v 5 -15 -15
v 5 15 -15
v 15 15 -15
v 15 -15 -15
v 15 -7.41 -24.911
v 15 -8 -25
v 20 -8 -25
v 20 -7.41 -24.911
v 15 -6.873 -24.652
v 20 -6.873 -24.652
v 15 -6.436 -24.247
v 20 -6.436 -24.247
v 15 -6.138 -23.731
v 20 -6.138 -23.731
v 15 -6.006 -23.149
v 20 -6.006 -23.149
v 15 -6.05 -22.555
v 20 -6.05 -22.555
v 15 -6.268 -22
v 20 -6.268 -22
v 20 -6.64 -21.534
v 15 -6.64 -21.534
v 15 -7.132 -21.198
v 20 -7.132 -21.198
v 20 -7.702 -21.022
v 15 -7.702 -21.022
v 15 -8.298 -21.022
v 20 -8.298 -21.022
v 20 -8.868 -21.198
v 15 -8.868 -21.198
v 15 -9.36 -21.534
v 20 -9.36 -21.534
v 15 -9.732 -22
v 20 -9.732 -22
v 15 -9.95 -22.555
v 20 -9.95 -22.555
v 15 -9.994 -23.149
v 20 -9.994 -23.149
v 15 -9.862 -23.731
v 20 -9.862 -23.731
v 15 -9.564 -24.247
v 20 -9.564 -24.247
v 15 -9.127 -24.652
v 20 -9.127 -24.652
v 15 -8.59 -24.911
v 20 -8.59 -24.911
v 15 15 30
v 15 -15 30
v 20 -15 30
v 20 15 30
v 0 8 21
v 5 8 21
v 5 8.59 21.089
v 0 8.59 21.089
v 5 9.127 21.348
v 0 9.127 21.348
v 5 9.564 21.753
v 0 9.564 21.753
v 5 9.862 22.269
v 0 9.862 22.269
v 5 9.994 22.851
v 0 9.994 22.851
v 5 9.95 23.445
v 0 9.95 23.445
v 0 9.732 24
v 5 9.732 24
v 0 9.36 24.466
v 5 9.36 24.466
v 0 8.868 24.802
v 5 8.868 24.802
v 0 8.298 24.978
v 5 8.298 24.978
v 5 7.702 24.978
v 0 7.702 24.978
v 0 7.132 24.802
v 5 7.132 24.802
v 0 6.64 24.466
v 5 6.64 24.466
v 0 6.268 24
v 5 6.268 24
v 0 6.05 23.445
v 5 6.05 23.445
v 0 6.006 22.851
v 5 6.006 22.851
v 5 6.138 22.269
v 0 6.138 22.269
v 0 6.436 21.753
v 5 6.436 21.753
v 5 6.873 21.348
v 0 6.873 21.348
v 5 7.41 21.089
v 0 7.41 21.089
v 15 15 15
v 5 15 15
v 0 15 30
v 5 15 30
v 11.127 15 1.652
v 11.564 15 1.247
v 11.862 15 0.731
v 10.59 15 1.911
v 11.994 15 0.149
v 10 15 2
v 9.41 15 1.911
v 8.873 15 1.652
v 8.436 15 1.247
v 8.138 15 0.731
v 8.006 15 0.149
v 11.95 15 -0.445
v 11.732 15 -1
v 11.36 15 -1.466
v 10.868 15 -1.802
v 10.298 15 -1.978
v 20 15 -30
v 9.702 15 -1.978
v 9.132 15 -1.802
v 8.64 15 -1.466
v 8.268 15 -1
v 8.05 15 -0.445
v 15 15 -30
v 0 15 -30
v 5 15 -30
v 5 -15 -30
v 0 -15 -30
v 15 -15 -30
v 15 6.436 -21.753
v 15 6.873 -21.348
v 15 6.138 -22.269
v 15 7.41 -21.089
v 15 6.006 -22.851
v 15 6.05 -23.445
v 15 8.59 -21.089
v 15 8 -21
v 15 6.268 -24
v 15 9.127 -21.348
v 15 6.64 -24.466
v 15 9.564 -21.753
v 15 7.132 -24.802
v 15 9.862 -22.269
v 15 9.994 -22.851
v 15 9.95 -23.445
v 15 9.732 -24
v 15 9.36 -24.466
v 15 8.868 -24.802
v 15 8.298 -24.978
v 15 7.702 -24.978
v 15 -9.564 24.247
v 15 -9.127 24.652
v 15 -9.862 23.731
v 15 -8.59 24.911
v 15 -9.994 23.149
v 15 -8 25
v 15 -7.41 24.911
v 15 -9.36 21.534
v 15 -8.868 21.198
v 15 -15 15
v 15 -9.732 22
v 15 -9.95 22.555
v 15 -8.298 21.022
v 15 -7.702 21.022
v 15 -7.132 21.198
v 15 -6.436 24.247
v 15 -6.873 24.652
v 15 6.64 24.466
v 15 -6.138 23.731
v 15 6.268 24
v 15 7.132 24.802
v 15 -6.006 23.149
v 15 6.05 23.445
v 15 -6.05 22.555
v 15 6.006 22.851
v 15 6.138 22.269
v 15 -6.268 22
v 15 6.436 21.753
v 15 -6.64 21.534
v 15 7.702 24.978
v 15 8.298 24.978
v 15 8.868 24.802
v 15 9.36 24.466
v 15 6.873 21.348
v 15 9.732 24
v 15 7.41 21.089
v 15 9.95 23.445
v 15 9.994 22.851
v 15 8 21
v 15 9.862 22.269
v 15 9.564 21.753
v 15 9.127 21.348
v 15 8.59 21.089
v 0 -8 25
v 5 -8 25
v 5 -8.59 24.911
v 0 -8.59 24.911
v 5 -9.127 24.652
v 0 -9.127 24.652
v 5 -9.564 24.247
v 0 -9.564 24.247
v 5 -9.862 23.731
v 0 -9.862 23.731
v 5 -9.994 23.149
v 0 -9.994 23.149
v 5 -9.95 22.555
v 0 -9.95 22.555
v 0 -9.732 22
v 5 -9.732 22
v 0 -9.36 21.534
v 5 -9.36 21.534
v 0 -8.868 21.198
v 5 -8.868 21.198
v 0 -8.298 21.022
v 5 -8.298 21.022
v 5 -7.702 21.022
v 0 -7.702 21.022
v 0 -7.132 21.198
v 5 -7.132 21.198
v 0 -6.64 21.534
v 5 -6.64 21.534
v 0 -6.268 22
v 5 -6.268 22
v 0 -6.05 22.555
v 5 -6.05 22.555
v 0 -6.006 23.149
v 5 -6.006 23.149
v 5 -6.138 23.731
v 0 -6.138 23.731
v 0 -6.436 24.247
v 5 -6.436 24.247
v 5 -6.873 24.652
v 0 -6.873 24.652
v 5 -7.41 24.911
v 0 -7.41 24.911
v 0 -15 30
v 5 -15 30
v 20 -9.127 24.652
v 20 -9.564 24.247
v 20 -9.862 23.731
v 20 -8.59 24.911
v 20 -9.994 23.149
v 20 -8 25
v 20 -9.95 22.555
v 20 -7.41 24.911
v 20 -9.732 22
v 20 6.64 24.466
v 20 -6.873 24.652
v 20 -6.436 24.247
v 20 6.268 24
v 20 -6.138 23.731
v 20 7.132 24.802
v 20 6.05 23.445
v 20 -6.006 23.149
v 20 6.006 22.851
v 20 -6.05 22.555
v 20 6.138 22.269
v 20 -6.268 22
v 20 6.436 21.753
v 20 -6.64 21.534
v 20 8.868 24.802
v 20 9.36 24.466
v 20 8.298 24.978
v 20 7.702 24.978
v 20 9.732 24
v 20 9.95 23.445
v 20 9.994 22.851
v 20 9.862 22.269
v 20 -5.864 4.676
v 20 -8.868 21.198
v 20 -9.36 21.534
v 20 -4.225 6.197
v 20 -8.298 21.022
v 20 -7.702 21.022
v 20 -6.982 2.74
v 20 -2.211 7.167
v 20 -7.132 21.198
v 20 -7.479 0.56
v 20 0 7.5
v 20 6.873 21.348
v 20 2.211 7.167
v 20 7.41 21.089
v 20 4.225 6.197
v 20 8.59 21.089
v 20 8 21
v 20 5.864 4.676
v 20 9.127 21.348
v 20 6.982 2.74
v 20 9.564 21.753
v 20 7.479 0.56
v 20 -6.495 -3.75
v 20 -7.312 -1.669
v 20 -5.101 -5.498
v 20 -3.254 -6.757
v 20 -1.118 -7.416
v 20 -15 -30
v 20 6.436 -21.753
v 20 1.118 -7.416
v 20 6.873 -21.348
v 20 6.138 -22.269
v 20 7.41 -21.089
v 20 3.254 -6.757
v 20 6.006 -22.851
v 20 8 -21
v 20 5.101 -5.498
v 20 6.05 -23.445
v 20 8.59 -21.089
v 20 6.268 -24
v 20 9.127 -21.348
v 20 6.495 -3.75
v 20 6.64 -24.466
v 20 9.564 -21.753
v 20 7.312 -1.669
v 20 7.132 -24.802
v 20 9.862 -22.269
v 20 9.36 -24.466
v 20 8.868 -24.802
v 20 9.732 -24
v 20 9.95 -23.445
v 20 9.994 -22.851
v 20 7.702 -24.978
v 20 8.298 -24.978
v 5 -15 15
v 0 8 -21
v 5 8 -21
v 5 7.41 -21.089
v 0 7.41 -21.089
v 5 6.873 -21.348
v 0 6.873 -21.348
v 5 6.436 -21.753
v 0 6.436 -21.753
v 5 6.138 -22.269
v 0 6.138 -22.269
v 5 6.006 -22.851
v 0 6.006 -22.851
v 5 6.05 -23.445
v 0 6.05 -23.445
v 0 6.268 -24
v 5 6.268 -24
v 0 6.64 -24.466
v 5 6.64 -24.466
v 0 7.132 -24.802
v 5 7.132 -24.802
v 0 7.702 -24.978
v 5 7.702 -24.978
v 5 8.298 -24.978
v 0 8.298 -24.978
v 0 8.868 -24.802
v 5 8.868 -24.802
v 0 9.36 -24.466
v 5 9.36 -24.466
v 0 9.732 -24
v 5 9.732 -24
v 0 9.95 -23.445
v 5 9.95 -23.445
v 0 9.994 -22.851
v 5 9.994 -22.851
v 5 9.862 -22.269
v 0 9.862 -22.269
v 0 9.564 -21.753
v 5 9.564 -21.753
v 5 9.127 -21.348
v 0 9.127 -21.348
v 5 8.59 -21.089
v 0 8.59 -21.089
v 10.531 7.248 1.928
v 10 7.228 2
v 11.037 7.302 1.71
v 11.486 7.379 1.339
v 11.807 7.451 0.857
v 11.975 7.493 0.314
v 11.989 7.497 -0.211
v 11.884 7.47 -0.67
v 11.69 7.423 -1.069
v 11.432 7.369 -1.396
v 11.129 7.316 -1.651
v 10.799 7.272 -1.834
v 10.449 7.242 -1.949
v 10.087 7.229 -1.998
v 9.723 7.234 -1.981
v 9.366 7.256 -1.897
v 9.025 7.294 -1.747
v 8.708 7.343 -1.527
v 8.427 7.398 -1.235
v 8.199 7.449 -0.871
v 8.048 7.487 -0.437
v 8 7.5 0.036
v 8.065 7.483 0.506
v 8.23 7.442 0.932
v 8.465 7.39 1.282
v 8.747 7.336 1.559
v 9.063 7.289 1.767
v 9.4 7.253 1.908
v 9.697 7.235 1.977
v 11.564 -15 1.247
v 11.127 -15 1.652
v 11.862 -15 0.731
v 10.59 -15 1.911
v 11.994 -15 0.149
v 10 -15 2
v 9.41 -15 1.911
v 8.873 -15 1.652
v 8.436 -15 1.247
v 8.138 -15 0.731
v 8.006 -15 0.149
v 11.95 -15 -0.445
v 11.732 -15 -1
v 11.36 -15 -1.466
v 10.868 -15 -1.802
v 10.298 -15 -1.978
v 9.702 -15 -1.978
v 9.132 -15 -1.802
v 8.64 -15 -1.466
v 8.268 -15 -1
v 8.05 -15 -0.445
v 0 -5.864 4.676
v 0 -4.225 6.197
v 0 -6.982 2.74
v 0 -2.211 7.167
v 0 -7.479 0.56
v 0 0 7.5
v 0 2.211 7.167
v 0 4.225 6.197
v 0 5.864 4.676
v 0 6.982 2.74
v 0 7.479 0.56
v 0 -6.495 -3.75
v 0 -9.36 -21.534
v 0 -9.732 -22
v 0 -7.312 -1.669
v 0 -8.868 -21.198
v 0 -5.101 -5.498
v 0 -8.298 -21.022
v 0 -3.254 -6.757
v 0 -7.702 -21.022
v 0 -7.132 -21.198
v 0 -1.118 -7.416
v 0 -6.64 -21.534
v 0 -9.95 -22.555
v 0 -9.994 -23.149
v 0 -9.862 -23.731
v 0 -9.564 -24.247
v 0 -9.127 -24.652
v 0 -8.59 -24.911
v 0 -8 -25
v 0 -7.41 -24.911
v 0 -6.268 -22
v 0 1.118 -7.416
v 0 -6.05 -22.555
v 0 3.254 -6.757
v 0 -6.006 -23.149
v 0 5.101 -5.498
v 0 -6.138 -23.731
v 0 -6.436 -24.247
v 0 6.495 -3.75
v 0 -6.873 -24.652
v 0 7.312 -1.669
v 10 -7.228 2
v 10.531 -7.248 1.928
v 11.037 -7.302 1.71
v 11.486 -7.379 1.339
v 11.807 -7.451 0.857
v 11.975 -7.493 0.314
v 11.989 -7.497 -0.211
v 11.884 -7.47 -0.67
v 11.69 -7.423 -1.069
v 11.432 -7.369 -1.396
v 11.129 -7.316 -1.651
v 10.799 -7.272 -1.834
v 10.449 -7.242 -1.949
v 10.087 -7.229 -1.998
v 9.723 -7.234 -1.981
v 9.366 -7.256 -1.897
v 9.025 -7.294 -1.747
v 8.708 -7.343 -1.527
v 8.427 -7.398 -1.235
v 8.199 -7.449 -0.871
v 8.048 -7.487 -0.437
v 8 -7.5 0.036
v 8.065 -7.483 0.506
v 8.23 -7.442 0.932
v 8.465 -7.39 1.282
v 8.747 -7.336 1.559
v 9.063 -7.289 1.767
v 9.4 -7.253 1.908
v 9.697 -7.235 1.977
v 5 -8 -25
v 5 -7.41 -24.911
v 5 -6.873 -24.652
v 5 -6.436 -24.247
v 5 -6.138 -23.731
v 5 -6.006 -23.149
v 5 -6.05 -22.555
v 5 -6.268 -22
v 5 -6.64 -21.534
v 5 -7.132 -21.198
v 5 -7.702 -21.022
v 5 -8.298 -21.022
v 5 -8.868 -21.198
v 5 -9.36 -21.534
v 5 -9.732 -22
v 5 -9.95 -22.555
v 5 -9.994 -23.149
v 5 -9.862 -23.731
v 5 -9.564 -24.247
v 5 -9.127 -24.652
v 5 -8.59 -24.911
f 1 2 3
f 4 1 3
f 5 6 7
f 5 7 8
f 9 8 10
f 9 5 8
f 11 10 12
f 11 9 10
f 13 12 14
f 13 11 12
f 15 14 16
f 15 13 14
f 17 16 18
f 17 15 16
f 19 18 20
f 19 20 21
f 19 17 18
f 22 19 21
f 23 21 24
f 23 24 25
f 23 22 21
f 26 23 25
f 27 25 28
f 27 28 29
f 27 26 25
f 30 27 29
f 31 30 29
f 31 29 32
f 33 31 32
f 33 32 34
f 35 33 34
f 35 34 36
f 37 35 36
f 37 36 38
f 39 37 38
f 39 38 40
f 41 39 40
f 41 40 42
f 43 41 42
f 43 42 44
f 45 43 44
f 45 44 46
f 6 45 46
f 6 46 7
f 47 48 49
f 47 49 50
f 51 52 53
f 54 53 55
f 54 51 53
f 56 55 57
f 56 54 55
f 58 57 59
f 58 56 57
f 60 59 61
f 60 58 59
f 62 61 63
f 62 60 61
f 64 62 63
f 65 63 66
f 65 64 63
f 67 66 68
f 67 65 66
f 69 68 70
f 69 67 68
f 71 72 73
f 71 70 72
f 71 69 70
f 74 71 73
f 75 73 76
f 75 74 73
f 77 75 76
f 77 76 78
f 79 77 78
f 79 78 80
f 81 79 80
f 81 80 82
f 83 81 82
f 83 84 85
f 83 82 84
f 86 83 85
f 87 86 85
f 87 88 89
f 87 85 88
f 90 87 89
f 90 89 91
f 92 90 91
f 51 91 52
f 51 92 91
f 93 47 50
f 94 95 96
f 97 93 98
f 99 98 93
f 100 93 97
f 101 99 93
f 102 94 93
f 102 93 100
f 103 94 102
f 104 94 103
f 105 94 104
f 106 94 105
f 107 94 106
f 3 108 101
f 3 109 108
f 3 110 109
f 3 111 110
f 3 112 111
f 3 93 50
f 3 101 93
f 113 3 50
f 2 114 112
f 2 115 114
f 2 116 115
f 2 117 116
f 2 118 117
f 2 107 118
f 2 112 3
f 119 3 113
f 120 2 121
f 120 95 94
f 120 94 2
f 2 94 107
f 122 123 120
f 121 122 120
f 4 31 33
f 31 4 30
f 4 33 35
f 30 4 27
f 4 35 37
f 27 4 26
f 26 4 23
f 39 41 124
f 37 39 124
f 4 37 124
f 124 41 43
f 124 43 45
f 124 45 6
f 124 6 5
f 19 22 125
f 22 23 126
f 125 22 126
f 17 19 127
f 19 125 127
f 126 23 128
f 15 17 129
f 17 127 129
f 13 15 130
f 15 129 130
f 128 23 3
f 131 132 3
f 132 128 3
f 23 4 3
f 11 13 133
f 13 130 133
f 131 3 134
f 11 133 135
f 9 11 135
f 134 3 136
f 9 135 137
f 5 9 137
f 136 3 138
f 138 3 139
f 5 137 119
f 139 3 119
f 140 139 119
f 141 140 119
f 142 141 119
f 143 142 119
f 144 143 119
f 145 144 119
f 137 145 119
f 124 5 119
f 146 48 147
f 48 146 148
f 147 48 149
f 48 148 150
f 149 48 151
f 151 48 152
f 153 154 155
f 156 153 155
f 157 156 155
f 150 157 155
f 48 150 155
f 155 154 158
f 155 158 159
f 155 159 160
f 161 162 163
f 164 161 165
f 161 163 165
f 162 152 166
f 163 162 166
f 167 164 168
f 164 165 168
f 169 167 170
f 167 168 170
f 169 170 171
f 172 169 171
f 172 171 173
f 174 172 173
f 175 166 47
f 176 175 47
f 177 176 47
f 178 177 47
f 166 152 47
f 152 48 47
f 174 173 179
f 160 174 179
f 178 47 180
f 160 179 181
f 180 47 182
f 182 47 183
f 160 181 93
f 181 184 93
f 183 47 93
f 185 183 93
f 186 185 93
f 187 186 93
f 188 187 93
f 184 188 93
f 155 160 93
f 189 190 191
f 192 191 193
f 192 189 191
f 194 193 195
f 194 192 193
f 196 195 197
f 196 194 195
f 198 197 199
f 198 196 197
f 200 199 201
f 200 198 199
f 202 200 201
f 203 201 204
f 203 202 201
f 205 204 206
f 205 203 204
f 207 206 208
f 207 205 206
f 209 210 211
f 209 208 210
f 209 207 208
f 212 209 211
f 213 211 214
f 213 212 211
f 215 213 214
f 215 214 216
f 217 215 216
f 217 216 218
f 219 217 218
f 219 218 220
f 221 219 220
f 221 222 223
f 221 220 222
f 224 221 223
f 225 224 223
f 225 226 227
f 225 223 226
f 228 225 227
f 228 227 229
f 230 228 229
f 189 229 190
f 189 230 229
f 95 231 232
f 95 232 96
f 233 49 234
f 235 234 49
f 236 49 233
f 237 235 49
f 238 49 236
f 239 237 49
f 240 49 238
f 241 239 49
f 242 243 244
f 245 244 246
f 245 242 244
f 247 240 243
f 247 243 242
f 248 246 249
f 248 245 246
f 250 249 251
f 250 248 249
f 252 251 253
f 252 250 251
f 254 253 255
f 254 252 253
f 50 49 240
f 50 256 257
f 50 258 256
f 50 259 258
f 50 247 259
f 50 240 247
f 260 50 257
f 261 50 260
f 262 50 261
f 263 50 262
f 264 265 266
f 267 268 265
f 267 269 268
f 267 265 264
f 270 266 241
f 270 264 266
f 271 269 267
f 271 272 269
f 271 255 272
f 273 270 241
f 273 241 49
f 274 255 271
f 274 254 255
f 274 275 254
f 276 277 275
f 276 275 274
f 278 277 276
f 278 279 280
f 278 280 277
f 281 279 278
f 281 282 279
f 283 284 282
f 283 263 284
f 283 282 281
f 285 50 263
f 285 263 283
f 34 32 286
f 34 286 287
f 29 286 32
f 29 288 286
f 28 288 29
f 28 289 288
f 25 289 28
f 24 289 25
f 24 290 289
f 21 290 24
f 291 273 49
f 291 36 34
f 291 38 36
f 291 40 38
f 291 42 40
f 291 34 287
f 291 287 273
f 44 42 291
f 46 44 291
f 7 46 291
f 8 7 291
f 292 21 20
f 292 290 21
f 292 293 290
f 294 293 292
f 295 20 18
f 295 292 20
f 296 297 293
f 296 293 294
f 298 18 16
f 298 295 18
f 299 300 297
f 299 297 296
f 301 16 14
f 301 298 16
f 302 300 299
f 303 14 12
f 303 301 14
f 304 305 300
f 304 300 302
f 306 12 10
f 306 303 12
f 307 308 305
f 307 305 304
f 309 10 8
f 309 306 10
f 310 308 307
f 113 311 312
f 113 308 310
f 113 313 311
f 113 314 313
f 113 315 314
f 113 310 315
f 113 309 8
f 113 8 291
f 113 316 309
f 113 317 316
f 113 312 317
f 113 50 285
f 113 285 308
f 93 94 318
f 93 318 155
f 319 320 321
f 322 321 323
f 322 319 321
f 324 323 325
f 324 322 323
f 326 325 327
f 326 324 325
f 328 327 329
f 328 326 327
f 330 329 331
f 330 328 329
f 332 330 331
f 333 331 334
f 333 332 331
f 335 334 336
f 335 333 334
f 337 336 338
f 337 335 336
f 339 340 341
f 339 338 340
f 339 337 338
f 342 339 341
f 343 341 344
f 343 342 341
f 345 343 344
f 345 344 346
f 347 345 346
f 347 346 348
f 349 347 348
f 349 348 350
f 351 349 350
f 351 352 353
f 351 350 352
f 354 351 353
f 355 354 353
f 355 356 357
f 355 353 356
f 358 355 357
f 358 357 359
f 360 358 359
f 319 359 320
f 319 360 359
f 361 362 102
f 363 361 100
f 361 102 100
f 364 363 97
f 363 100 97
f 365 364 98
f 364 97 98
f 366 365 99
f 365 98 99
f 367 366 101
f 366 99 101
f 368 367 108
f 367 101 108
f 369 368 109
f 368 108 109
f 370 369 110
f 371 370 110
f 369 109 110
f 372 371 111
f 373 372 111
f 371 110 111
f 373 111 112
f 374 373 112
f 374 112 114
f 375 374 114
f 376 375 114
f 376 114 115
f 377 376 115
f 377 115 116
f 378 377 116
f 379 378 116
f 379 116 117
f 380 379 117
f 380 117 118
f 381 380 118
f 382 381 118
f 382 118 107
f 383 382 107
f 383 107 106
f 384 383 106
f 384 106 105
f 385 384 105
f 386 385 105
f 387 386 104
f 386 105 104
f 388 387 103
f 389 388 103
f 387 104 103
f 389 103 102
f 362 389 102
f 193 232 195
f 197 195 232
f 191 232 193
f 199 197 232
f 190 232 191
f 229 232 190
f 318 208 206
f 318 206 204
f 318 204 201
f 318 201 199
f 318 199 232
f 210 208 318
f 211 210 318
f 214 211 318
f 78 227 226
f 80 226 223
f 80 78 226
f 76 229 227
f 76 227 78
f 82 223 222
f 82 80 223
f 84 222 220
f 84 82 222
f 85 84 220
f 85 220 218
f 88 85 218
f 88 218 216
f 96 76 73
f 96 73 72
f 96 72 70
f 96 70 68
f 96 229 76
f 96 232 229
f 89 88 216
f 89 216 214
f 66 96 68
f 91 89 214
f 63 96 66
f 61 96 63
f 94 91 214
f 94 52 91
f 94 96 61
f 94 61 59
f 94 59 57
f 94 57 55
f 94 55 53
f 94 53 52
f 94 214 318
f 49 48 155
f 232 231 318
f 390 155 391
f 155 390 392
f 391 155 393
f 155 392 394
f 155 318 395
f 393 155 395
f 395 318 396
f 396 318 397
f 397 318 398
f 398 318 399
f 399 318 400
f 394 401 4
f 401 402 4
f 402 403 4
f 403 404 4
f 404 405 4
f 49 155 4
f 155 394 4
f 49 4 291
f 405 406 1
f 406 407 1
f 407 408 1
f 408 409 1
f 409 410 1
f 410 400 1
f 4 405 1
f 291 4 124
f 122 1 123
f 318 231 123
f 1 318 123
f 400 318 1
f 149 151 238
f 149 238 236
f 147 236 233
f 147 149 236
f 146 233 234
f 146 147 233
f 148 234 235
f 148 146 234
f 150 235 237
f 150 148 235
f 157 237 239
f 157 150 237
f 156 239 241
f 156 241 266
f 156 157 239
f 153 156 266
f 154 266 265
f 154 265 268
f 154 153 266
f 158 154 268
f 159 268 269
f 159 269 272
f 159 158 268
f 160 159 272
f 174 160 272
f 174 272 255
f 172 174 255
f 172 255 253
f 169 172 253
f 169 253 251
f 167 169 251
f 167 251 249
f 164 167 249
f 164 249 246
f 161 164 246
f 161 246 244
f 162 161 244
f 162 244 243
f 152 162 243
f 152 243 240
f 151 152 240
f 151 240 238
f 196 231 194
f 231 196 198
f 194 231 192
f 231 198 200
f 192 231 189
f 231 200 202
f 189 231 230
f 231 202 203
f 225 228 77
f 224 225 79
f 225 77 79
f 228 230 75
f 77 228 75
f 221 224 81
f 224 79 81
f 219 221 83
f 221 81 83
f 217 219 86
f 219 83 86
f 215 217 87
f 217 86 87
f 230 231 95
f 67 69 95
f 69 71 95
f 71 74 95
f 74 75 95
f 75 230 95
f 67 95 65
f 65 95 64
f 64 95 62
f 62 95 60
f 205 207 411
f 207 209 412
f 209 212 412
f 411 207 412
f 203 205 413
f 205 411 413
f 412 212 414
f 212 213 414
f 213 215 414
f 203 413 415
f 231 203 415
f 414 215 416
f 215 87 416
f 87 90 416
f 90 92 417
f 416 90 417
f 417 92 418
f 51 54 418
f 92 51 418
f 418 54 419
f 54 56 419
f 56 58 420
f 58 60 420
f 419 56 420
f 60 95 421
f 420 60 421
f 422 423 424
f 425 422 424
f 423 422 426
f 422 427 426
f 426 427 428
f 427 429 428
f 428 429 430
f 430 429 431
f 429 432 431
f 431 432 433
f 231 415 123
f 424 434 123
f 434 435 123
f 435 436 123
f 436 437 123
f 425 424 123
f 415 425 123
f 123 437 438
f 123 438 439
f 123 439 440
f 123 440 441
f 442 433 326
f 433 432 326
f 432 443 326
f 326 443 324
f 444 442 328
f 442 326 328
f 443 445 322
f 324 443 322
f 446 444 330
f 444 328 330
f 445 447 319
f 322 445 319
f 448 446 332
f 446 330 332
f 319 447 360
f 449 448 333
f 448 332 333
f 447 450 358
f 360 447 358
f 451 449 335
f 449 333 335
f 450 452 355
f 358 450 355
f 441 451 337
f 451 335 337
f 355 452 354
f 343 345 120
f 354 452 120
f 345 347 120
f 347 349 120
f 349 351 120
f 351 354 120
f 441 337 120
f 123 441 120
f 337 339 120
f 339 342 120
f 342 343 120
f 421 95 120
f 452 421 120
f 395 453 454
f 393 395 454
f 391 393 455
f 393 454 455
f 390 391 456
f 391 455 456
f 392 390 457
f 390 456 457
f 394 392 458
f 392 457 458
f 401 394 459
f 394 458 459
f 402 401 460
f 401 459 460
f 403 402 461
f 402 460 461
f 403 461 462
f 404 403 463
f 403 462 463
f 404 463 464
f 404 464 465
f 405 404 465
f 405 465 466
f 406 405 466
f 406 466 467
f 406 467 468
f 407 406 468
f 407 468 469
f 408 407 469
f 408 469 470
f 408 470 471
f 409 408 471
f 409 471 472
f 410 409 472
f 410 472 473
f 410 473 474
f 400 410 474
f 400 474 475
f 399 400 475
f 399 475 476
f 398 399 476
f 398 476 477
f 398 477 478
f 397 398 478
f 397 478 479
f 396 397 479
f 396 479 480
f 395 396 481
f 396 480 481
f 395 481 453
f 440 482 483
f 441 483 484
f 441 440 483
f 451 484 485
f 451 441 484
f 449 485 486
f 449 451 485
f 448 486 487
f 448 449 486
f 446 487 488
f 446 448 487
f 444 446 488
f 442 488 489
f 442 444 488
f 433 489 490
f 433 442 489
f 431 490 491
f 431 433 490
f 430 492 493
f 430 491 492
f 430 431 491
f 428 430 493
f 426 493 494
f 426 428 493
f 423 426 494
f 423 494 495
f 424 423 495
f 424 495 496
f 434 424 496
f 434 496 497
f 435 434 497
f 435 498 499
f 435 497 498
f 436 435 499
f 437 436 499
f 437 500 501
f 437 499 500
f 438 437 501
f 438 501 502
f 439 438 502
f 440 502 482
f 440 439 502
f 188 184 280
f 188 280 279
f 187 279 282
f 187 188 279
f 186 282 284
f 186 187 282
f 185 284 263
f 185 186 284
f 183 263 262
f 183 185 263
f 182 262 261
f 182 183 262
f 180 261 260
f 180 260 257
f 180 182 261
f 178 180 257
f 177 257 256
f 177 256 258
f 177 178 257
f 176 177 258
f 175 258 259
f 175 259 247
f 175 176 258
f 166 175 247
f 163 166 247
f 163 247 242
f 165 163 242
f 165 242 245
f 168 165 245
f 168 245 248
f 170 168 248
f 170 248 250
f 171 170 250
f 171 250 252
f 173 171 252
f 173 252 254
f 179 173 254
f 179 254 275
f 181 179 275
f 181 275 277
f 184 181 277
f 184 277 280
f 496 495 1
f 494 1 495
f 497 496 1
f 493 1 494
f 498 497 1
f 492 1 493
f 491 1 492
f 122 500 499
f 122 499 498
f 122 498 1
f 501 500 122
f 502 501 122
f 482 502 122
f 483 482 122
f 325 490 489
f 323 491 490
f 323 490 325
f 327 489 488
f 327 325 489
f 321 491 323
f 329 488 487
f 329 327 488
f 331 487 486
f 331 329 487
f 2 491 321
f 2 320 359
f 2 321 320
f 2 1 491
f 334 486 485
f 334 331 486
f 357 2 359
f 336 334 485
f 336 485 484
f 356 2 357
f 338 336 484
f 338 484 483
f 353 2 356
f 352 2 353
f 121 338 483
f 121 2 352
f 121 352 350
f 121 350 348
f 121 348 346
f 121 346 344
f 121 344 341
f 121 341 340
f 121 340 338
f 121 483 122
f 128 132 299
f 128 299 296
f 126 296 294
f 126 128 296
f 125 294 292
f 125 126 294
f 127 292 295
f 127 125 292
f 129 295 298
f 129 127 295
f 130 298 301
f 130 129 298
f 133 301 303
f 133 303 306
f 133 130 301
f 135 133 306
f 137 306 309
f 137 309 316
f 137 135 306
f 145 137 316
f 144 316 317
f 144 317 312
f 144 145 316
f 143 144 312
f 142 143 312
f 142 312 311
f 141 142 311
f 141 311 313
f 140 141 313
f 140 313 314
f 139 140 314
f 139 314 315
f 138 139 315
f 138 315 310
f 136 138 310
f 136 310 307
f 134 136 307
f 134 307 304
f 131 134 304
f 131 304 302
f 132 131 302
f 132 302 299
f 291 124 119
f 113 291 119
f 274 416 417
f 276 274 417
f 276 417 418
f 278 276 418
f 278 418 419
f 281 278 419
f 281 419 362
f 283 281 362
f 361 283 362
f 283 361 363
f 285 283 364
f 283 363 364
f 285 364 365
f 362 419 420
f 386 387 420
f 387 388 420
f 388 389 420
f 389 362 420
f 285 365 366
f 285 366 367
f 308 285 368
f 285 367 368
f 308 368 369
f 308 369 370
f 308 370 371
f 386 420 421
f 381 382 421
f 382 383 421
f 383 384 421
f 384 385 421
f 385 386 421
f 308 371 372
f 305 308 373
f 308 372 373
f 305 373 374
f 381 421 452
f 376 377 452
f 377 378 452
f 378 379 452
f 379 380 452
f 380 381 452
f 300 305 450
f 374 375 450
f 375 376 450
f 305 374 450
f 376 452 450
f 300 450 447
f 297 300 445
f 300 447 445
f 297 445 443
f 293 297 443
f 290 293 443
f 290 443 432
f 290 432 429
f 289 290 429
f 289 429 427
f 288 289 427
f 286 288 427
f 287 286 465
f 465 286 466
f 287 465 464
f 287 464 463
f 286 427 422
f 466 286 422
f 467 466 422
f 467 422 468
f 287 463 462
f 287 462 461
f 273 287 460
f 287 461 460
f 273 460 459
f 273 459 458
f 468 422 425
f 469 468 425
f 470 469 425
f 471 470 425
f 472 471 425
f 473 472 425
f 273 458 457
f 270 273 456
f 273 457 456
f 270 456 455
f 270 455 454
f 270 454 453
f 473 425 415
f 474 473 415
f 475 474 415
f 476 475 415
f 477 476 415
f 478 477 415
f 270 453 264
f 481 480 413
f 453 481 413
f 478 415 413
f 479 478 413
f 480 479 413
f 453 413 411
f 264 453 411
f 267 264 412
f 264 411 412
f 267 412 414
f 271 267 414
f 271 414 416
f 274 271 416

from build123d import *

# Parameters (mm, degrees)
SKETCH_1_W          = 60
SKETCH_1_H          = 30
SKETCH_1_R          = 2
EXTRUDE_1_DEPTH     = 20
SKETCH_2_W          = 10
SKETCH_2_H          = 15
CUT_EXTRUDE_1_DEPTH = 47.904157598
SKETCH_3_R          = 7.5
CUT_EXTRUDE_2_DEPTH = 20
SKETCH_4_R          = 2
CUT_EXTRUDE_3_DEPTH = 47.904157598


with BuildPart() as part:
    # 스케치1 → 보스-돌출1 (new body)
    with BuildSketch(Plane(origin=(0, 0, 0), x_dir=(0, 0, -1), z_dir=(1, 0, 0))):
        Rectangle(SKETCH_1_W, SKETCH_1_H)
        with Locations((-23, 8)):
            Circle(SKETCH_1_R, mode=Mode.SUBTRACT)
        with Locations(Location((-23, -8, 0), (0, 0, 180))):
            Circle(SKETCH_1_R, mode=Mode.SUBTRACT)
        with Locations((23, -8)):
            Circle(SKETCH_1_R, mode=Mode.SUBTRACT)
        with Locations(Location((23, 8, 0), (0, 0, 180))):
            Circle(SKETCH_1_R, mode=Mode.SUBTRACT)
    extrude(amount=EXTRUDE_1_DEPTH)

    # 스케치2 → 컷-돌출1 (cut, through all)
    with BuildSketch(Plane(origin=(0, 15, 0), x_dir=(1, 0, 0), z_dir=(0, 1, 0))):
        with Locations((10, 22.5)):
            Rectangle(SKETCH_2_W, SKETCH_2_H)
        with Locations((10, -22.5)):
            Rectangle(SKETCH_2_W, SKETCH_2_H)
    extrude(amount=-CUT_EXTRUDE_1_DEPTH, mode=Mode.SUBTRACT)

    # 스케치3 → 컷-돌출2 (cut)
    with BuildSketch(Plane.ZY):
        Circle(SKETCH_3_R)
    extrude(amount=-CUT_EXTRUDE_2_DEPTH, mode=Mode.SUBTRACT)

    # 스케치4 → 컷-돌출3 (cut, through all)
    with BuildSketch(Plane(origin=(0, 15, 0), x_dir=(1, 0, 0), z_dir=(0, 1, 0))):
        with Locations(Location((10, 0, 0), (0, 0, 270))):
            Circle(SKETCH_4_R)
    extrude(amount=-CUT_EXTRUDE_3_DEPTH, mode=Mode.SUBTRACT)


solid = part.part
